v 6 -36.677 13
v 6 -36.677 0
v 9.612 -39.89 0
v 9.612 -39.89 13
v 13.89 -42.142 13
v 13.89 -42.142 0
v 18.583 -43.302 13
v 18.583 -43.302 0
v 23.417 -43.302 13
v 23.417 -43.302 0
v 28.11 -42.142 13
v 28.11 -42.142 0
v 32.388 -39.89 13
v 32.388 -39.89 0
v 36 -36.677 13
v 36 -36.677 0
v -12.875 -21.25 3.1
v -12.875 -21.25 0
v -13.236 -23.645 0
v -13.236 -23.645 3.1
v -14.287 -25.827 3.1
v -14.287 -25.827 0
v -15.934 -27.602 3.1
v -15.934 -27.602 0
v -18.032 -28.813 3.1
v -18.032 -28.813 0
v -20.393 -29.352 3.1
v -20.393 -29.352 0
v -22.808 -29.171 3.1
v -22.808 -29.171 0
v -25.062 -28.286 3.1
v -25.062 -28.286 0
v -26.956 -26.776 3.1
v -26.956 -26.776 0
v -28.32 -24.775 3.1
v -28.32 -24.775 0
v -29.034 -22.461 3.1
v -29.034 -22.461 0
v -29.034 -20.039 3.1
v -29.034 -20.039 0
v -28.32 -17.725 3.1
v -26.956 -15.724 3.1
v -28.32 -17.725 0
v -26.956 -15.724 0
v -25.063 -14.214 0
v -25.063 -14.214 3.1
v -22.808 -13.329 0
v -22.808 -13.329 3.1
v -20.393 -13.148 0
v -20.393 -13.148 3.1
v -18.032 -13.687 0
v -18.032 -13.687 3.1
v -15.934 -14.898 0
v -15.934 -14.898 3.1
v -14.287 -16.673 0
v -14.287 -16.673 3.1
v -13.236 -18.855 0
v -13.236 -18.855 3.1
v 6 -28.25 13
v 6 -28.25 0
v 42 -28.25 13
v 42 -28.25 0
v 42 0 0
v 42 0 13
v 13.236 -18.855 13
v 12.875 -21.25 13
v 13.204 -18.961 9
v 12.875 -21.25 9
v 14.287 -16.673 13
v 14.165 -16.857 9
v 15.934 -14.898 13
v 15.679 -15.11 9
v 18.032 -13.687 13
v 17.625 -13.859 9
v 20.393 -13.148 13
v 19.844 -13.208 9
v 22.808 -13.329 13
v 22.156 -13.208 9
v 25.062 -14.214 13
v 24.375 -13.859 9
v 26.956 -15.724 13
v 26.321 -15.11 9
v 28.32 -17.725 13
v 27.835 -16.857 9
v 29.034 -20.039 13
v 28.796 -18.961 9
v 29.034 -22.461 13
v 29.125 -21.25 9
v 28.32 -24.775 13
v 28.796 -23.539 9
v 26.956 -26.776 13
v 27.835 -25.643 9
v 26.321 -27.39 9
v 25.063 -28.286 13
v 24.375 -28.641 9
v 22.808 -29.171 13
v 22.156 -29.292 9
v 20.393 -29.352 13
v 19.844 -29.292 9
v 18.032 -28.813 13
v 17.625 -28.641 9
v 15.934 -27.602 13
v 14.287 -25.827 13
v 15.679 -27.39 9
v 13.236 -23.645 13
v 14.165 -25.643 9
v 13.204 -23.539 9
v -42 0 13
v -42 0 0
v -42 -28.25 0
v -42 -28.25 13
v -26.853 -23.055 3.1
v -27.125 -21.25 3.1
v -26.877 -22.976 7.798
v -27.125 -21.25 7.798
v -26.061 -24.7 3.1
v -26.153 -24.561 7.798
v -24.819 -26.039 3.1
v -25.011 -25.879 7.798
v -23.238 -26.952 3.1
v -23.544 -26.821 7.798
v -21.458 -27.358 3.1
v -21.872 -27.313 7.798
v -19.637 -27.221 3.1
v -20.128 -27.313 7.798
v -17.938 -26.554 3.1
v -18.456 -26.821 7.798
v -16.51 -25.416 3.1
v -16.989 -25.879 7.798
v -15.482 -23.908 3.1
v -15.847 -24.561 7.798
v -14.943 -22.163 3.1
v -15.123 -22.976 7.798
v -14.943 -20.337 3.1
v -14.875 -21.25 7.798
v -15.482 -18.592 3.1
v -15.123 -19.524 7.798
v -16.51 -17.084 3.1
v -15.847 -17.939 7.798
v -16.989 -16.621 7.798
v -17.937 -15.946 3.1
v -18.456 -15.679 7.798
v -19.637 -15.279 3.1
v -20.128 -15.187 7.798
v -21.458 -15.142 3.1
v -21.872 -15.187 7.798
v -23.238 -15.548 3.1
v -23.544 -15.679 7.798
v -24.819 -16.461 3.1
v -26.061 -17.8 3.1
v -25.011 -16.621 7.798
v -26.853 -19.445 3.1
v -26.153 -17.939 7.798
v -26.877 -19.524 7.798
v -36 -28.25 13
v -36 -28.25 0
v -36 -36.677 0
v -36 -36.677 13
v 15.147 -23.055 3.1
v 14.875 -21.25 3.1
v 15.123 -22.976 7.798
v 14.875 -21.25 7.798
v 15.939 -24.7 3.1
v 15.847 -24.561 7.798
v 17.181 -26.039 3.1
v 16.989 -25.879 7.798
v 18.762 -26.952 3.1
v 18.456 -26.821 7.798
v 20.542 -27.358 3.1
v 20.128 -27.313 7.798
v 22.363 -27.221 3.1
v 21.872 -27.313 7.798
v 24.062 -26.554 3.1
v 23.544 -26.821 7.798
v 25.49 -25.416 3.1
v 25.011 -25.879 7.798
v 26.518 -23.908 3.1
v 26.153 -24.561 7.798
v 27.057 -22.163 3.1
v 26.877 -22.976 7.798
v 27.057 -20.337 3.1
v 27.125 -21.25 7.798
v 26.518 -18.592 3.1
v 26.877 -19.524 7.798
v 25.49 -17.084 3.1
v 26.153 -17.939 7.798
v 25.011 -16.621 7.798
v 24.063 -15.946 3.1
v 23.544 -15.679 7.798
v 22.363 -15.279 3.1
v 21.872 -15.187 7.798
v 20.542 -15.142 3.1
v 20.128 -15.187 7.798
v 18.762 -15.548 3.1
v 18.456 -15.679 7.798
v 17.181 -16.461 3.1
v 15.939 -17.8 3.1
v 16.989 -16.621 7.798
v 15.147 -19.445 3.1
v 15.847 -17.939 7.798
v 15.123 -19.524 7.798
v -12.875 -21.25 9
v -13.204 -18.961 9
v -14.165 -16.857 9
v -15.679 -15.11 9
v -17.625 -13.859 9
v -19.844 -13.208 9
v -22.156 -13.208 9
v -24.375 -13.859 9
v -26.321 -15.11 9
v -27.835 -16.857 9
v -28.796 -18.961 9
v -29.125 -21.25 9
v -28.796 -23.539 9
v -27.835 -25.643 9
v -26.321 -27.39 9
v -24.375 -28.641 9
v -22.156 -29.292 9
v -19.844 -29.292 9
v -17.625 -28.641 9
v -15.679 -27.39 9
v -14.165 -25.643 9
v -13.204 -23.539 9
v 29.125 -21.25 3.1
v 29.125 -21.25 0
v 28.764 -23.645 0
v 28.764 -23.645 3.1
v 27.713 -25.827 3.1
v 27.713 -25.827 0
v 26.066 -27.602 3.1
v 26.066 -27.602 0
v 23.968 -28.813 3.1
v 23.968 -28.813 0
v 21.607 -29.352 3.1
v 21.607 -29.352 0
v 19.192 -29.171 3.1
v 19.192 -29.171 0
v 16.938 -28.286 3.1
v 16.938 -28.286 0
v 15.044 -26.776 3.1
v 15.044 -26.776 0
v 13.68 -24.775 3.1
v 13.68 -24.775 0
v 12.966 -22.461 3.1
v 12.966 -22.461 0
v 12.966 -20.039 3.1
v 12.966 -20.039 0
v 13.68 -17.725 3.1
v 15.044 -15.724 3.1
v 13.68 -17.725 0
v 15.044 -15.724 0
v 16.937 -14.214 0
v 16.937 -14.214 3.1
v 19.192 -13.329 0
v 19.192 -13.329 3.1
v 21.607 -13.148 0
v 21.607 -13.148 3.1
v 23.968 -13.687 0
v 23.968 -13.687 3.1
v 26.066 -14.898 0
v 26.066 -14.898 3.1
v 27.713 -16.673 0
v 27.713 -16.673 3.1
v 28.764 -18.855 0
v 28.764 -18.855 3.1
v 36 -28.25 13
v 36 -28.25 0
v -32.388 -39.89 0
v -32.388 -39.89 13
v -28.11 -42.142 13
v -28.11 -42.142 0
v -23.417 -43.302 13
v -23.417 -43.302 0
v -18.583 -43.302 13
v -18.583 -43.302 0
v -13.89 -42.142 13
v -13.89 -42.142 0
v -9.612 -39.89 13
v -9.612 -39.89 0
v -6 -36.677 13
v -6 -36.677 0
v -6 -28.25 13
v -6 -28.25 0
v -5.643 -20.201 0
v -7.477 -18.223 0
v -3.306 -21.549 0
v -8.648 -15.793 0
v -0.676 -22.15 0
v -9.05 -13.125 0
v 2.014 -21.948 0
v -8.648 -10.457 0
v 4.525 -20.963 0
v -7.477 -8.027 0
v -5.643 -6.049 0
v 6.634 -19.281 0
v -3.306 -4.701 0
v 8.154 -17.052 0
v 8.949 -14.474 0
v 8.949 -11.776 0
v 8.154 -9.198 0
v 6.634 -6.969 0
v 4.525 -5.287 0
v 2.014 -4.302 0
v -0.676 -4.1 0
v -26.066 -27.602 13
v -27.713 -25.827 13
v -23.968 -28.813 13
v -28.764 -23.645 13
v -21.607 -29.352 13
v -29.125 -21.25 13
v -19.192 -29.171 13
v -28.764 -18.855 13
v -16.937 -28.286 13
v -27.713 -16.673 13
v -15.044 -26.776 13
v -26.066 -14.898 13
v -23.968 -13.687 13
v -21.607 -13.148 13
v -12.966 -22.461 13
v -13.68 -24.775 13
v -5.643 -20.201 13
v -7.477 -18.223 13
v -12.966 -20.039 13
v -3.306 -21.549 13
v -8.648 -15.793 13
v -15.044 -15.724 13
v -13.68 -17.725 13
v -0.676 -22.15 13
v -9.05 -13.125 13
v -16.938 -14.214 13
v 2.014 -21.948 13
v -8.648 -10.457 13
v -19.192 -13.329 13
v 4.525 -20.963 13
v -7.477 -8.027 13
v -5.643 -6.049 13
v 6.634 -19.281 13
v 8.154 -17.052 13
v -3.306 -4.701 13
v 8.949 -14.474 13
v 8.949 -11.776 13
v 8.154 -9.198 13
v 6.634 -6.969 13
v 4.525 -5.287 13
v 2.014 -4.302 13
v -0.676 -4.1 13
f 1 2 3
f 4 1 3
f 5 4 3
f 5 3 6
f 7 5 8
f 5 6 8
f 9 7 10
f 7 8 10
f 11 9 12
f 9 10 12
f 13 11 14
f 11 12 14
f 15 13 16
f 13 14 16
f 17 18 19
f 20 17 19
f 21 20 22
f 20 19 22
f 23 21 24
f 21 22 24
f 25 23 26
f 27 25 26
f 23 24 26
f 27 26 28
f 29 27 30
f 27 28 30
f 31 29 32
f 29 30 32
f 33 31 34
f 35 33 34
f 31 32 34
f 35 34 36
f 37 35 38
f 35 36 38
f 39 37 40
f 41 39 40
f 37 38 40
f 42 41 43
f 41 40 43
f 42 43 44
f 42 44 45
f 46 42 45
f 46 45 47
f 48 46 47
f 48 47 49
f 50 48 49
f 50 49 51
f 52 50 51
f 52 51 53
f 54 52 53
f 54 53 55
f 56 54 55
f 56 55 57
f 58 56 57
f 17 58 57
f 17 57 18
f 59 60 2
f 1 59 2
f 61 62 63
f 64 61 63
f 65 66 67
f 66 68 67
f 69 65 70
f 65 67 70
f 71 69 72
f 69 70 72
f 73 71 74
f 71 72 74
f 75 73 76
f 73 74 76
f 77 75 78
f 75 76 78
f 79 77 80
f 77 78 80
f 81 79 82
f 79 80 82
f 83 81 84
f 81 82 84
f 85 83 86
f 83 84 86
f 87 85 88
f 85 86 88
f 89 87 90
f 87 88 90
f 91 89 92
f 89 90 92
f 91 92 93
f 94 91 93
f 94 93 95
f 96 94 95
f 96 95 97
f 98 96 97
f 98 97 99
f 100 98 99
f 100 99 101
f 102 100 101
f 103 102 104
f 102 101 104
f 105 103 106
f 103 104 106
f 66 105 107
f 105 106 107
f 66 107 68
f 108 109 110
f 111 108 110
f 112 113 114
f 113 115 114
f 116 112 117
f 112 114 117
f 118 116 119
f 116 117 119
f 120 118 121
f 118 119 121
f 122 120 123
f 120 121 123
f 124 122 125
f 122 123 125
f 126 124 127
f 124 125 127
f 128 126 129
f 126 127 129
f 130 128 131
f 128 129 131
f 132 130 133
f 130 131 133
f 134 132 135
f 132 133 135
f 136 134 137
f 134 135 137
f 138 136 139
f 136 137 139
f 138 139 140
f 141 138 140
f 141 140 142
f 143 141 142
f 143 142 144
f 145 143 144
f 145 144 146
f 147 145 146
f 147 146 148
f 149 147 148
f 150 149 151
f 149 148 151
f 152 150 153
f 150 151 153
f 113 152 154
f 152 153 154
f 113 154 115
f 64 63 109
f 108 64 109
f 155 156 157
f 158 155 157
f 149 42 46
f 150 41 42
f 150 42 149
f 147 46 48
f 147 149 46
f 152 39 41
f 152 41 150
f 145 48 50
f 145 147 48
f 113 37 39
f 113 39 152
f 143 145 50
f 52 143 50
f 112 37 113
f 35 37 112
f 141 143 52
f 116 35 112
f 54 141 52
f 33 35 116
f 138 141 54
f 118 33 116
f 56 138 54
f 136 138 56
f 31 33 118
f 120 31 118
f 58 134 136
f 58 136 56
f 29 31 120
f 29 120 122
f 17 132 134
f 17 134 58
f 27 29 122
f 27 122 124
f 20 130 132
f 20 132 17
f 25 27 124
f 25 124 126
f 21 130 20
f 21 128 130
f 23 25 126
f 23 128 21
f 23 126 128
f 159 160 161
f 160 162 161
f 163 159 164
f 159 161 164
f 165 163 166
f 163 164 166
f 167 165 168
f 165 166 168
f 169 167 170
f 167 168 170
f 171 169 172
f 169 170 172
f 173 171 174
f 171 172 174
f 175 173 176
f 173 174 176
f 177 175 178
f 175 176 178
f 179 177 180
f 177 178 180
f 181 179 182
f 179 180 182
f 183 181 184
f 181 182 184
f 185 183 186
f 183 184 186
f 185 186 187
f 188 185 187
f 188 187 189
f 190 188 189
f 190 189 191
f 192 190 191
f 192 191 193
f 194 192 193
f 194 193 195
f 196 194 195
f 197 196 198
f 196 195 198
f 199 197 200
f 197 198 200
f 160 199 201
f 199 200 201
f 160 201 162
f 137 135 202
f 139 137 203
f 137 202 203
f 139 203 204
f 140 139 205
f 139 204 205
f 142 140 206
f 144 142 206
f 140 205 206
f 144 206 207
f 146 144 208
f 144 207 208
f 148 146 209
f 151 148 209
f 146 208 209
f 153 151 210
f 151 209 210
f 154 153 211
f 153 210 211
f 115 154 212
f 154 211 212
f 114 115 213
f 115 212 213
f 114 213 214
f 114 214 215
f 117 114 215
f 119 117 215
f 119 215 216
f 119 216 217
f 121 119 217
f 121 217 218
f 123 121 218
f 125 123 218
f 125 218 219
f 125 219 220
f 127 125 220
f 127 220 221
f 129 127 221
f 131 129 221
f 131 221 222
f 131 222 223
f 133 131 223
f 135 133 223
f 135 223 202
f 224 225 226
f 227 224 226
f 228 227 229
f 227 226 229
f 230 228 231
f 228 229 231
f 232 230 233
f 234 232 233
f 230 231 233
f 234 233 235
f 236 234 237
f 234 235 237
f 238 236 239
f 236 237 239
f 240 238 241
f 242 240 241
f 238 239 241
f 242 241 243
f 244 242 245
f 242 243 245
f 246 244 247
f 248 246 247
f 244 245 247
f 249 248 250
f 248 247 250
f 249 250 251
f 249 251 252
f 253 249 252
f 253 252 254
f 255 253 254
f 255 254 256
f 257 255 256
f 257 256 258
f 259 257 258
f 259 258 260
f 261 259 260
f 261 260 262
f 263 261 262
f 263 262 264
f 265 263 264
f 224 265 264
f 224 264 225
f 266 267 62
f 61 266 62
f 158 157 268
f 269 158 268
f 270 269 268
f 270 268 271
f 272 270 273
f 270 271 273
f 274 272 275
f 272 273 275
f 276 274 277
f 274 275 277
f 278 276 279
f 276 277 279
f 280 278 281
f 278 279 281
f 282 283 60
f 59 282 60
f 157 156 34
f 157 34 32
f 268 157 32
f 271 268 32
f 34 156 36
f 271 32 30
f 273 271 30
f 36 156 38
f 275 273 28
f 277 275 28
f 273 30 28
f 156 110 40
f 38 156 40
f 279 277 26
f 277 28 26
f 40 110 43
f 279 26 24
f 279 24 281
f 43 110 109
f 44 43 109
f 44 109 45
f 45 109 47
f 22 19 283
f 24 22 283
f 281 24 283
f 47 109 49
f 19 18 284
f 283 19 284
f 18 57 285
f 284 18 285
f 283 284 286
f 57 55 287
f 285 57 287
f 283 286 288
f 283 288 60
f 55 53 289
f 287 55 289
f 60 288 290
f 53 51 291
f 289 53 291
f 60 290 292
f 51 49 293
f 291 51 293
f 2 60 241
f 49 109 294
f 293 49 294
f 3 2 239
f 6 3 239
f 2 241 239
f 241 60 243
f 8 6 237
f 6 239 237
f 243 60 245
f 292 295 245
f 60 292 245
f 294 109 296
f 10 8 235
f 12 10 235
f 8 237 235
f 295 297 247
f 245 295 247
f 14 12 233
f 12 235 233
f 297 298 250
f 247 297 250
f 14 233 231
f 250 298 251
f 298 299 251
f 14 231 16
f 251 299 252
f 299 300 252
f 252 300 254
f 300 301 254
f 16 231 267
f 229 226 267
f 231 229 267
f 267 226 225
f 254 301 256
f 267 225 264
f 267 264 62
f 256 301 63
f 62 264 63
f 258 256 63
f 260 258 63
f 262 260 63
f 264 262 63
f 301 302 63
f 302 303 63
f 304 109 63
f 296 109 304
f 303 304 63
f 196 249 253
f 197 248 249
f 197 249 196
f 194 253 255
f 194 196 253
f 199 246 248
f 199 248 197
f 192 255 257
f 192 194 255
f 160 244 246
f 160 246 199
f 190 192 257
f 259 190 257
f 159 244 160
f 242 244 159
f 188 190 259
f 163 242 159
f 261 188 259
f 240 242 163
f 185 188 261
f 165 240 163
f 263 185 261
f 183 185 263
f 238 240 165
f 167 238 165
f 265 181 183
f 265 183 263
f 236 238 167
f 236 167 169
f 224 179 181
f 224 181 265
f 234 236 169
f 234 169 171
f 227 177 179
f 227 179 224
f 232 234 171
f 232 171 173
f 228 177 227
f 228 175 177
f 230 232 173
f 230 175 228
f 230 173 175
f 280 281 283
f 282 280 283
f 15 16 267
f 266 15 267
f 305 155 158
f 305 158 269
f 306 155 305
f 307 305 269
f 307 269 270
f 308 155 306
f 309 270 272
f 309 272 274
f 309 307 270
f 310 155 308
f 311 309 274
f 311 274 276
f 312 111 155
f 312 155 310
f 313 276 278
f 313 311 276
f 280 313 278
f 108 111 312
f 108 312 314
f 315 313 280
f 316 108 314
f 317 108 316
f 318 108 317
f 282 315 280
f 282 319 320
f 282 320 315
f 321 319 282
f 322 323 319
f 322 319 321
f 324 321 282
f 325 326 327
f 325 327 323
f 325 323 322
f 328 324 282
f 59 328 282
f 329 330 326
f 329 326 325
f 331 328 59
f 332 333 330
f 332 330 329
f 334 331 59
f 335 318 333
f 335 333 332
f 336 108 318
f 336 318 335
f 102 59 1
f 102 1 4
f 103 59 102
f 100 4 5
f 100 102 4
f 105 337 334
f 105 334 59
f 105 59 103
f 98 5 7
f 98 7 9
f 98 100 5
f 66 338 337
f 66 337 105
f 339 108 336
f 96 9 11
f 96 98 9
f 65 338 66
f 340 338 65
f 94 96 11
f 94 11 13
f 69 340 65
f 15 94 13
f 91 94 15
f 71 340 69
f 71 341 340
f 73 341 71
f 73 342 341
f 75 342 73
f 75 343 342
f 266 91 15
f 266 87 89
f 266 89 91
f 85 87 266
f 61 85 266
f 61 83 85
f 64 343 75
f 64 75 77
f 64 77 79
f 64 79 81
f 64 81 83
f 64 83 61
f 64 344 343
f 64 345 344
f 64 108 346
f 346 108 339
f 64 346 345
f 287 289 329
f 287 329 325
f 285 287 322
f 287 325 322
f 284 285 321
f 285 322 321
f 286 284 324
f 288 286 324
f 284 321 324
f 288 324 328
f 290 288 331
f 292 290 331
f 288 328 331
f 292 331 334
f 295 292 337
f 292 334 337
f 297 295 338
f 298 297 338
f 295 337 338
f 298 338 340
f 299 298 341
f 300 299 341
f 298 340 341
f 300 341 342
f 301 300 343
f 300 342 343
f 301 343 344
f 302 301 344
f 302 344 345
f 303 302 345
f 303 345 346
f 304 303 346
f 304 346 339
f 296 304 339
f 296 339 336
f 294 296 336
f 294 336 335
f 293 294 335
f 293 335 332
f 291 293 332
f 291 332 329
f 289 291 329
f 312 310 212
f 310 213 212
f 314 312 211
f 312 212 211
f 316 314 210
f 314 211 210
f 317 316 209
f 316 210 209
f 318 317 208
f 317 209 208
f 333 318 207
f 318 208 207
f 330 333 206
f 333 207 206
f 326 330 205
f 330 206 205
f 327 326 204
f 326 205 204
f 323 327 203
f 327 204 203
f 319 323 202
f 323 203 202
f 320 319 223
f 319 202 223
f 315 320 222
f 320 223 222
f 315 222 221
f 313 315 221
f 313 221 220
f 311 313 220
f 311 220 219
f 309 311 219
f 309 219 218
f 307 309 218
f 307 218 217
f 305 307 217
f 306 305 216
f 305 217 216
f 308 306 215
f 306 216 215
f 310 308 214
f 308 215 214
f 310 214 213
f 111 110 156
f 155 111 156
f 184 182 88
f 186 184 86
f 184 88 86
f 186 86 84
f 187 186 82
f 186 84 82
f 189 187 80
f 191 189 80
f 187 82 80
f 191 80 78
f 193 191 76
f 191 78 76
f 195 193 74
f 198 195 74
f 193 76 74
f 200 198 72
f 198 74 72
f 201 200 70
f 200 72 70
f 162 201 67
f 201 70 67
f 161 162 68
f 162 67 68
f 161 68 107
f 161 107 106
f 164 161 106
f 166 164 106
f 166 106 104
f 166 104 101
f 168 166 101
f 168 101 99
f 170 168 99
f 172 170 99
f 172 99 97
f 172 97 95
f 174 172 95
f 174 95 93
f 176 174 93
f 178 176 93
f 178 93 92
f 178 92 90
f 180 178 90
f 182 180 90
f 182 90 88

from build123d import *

# Parameters (mm, degrees)
F0_W           = 21
F0_H           = 5
F0_H_2         = 16.25
F1_DEPTH       = 13
F2_D           = 12.25
F2_CBORE_D     = 16.25
F2_CBORE_DEPTH = 3.1
F4_D           = 16.25
F4_DEPTH       = 4
F4_TIP         = 4.8819925296
F5_D           = 18.1


with BuildPart() as f1:
    # F0 (on Top) → F1 (new body)
    with BuildSketch(Plane.XY):
        with Locations((-10.5, -2.5)):
            Rectangle(F0_W, F0_H)
        with Locations((10.5, -2.5)):
            Rectangle(F0_W, F0_H)
        Polygon((-21, -5), (-21, 0), (-26, 0), (-42, 0), (-42, -5), align=None)
        Polygon((26, 0), (21, 0), (21, -5), (42, -5), (42, 0), align=None)
        with Locations((-31.5, -13.125)):
            Rectangle(F0_W, F0_H_2)
        with Locations((31.5, -13.125)):
            Rectangle(F0_W, F0_H_2)
        Polygon((0, -28.25), (0, -21.25), (-21, -21.25), (-21, -28.25), (-6, -28.25), align=None)
        Polygon((21, -21.25), (0, -21.25), (0, -28.25), (6, -28.25), (21, -28.25), align=None)
        Polygon((-21, -28.25), (-21, -21.25), (-42, -21.25), (-42, -28.25), (-36, -28.25), align=None)
        Polygon((42, -21.25), (21, -21.25), (21, -28.25), (36, -28.25), (42, -28.25), align=None)
        with BuildLine():
            Line((-6, -28.25), (-21, -28.25))
            Line((-21, -28.25), (-36, -28.25))
            Line((-36, -28.25), (-36, -36.6772486205))
            ThreePointArc((-36, -36.6772486205), (-21, -43.4484920652), (-6, -36.6772486205))
            Line((-6, -36.6772486205), (-6, -28.25))
        make_face()
        with BuildLine():
            Line((36, -28.25), (21, -28.25))
            Line((21, -28.25), (6, -28.25))
            Line((6, -28.25), (6, -36.6772486205))
            ThreePointArc((6, -36.6772486205), (21, -43.4484920652), (36, -36.6772486205))
            Line((36, -36.6772486205), (36, -28.25))
        make_face()
        with Locations((10.5, -13.125)):
            Rectangle(F0_W, F0_H_2)
        with Locations((-10.5, -13.125)):
            Rectangle(F0_W, F0_H_2)
    extrude(amount=F1_DEPTH)

    # F2 (through all)
    with Locations(Plane(origin=(0, 0, 0), x_dir=(1, 0, 0), z_dir=(0, 0, -1))):
        with Locations((21, 21.25), (-21, 21.25)):
            CounterBoreHole(F2_D / 2, F2_CBORE_D / 2, F2_CBORE_DEPTH)

    # F4
    with Locations(Plane.XY.offset(13)):
        with Locations((-21, -21.25), (21, -21.25)):
            Hole(F4_D / 2, depth=F4_DEPTH)
            with Locations((0, 0, -(F4_DEPTH + F4_TIP / 2))):  # 118° drill point
                Cone(0, F4_D / 2, F4_TIP, mode=Mode.SUBTRACT)

    # F5 (through all)
    with Locations(Plane(origin=(0, 0, 0), x_dir=(1, 0, 0), z_dir=(0, 0, -1))):
        with Locations((0, 13.125)):
            Hole(F5_D / 2)


solid = f1.part
